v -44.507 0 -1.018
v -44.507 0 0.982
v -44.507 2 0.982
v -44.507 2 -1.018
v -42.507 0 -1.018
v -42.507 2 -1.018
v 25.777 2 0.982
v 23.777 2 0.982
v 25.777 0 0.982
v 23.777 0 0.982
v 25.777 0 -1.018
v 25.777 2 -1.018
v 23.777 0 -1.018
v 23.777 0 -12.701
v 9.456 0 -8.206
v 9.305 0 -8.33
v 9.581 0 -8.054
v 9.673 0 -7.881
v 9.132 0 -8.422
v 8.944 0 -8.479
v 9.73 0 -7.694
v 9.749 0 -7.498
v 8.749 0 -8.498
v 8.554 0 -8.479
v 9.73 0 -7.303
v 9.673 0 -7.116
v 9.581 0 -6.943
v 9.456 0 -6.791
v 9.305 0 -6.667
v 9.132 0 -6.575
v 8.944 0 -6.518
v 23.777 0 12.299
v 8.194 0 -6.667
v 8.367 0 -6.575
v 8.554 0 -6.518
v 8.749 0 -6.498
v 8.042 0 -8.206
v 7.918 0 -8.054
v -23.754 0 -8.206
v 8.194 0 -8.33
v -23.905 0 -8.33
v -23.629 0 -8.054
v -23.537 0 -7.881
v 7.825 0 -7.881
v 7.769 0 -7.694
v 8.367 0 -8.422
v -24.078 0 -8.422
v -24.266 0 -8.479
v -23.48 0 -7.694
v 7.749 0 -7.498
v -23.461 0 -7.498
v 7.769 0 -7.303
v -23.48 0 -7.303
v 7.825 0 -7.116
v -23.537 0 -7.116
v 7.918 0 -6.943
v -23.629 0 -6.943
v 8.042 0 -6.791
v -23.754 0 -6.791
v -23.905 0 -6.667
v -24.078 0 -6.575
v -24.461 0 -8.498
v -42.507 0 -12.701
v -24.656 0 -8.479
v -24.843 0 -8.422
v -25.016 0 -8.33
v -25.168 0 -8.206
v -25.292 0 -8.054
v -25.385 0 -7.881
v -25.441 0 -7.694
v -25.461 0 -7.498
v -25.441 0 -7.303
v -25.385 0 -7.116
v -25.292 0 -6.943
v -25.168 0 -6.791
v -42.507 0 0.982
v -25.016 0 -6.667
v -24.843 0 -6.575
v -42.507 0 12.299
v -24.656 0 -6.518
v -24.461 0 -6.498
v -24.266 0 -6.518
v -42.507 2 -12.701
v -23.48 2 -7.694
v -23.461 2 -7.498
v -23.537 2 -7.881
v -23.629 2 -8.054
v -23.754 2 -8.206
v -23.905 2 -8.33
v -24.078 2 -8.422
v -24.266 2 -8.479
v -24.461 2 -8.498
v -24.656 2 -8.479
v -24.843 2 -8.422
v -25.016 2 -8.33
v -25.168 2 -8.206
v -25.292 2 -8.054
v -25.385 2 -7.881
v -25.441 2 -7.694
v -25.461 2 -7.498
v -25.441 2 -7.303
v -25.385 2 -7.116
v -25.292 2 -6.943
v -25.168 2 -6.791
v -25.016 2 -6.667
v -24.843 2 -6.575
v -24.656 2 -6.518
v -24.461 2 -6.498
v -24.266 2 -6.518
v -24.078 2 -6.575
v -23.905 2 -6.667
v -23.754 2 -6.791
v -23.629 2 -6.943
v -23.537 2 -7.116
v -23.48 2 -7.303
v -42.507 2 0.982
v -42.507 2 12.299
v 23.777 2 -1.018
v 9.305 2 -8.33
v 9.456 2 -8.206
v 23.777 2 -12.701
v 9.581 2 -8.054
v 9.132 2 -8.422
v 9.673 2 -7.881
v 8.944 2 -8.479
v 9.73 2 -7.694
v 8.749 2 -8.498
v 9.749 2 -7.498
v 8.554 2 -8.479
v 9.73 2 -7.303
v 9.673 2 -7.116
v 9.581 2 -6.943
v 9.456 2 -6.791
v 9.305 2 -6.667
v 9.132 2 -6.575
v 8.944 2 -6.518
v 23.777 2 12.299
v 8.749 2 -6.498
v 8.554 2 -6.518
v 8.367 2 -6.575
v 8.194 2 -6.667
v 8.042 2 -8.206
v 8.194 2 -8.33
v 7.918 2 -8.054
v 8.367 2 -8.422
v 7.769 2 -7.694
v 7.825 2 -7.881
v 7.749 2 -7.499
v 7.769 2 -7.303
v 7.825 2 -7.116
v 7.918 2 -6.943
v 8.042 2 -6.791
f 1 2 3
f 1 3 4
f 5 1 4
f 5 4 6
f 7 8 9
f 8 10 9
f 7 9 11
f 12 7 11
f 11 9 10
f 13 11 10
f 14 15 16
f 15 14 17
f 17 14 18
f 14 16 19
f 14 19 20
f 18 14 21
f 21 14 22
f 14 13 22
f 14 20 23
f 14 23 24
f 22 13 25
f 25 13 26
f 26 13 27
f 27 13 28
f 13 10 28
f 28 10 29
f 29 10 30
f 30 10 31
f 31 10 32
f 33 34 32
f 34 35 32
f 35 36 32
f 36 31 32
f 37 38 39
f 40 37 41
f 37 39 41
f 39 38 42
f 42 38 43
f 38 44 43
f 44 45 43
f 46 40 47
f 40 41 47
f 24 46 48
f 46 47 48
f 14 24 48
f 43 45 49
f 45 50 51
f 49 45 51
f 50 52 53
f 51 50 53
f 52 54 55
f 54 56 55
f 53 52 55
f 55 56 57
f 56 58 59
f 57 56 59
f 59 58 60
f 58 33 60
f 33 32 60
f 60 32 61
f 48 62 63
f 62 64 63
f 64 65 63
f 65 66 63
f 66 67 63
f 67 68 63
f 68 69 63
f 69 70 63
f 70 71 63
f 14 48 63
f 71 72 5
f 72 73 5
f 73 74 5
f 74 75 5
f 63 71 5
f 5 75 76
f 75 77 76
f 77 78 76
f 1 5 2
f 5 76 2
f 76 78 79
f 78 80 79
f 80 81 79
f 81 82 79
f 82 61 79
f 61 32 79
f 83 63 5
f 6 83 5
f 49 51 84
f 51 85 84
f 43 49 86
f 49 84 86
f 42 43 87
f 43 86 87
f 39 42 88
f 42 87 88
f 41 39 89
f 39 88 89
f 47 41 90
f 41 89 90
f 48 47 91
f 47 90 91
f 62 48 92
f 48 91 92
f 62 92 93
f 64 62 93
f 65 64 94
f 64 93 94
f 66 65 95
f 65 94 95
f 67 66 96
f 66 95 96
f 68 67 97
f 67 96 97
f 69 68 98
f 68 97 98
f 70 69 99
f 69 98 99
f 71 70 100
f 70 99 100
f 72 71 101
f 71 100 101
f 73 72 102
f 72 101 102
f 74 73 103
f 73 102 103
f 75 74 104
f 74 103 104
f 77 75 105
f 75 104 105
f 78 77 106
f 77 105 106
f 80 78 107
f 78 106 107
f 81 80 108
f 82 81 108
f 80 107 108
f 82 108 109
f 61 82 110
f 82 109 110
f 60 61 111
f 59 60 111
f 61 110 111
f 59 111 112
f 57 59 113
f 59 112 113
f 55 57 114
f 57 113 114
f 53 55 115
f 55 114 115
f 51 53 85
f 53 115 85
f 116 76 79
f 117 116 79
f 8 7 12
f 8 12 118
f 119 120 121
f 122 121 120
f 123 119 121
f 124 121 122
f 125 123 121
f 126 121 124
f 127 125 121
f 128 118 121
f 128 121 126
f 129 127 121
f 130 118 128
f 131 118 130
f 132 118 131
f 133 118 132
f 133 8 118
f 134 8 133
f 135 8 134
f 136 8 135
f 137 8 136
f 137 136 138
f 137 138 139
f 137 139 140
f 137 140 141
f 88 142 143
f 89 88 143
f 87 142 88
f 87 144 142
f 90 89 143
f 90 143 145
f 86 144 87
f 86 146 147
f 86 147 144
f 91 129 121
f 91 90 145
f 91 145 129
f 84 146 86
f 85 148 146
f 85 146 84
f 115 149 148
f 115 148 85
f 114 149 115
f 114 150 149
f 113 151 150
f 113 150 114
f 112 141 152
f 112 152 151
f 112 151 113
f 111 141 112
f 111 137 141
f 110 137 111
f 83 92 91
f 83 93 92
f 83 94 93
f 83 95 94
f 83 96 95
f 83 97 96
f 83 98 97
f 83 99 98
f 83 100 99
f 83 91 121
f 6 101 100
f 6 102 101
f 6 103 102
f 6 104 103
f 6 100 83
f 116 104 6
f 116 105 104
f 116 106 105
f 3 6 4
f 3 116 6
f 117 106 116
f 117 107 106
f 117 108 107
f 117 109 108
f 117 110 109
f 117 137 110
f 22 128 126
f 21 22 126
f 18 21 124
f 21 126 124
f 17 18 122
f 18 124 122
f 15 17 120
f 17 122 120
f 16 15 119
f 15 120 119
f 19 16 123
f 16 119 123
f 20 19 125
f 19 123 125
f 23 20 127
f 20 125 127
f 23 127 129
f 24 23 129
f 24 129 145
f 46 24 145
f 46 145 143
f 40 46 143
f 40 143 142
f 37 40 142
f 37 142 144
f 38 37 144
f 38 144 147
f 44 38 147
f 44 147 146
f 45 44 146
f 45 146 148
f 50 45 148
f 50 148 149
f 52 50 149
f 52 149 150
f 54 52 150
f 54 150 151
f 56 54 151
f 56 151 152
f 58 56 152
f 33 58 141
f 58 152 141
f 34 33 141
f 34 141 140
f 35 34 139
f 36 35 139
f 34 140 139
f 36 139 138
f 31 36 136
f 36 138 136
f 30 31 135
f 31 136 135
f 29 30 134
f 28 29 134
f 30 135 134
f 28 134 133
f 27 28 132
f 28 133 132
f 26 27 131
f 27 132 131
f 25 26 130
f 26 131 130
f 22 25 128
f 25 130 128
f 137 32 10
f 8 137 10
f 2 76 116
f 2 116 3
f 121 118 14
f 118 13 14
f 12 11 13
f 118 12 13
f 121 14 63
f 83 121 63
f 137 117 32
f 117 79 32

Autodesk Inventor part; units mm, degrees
ref_plane "YZ Plane" through (0, 0, 0) normal (1, 0, 0) x (0, 1, 0)
ref_plane "XZ Plane" through (0, 0, 0) normal (0, 1, 0) x (-1, 0, 0)
ref_plane "XY Plane" through (0, 0, 0) normal (0, 0, 1) x (1, 0, 0)
sketch "Sketch1" plane through (0, 0, 0) normal (0, 1, 0) x (-1, 0, 0)
  line L0 (42.5071, 12.299) -> (-23.7769, 12.299)
  line L1 (-23.7769, 12.299) -> (-23.7769, -12.701)
  line L2 (-23.7769, -12.701) -> (42.5071, -12.701)
  line L3 (42.5071, -12.701) -> (42.5071, 12.299)
  line L4 (-23.7769, 0.9818) -> (-25.7769, 0.9818)
  line L5 (-25.7769, 0.9818) -> (-25.7769, -1.0182)
  line L6 (-25.7769, -1.0182) -> (-23.7769, -1.0182)
  line L7 (-23.7769, -1.0182) -> (-23.7769, 0.9818)
  line L8 (44.5071, -1.0182) -> (42.5071, -1.0182)
  line L9 (42.5071, -1.0182) -> (42.5071, 0.9818)
  line L10 (42.5071, 0.9818) -> (44.5071, 0.9818)
  line L11 (44.5071, 0.9818) -> (44.5071, -1.0182)
  point P0 (0, 0)
  dimension "d0" = 66.284
  dimension "d1" = 25
  dimension "d2" = 2
  dimension "d3" = 2
  dimension "d11" = 2
  dimension "d12" = 2
extrude "Extrusion1" add sketch "Sketch1" along normal blind 2
sketch "Sketch2" plane through (0, 2, 0) normal (0, 1, 0) x (1, 0, 0)
  circle A0 centre (8.7493, 7.4985) radius 1
  line L0 (8.7493, 7.4985) -> (-24.4607, 7.4985)
  circle A1 centre (-24.4607, 7.4985) radius 1
  point P0 (0, 0)
  dimension "d6" = 2
  dimension "d7" = 33.21
  dimension "d8" = 2
extrude "Extrusion2" cut sketch "Sketch2" against normal blind 2
properties part number "Lclamp2"
